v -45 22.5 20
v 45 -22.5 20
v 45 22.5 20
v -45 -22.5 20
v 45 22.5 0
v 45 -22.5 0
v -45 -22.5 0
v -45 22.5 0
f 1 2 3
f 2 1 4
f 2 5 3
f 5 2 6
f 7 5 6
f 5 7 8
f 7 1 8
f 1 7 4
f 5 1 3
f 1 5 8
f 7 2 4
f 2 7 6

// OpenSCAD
// Drying Rack for 10 Microscope Slides
// Base dimensions
base_length = 90;   // X
base_width = 45;    // Y
base_height = 20;   // Z

// Slot dimensions
slot_length = 77;   // X
slot_width = 1.6;   // Y
slot_depth = 10;    // Z

// Slot arrangement
num_slots = 10;
slot_spacing = 3.5; // centre-to-centre in Y

// Calculate total width of the slot group
total_slot_group_width = (num_slots - 1) * slot_spacing;

// Starting Y position for the first slot (to centre the group)
start_y = -total_slot_group_width / 2;

$fn = 64;

// Base block
translate([-base_length/2, -base_width/2, 0])
    cube([base_length, base_width, base_height]);

// Cut out slots
for (i = [0 : num_slots-1]) {
    y_pos = start_y + i * slot_spacing;
    
    // Slot extends slightly past the base in X and Z to ensure clean cuts
    // Center the slot in X at 0, center in Y at y_pos, top at base_height
    translate([0, y_pos, base_height - slot_depth/2 - 0.01])
        cube([slot_length + 0.02, slot_width, slot_depth + 0.02], center = true);
}
